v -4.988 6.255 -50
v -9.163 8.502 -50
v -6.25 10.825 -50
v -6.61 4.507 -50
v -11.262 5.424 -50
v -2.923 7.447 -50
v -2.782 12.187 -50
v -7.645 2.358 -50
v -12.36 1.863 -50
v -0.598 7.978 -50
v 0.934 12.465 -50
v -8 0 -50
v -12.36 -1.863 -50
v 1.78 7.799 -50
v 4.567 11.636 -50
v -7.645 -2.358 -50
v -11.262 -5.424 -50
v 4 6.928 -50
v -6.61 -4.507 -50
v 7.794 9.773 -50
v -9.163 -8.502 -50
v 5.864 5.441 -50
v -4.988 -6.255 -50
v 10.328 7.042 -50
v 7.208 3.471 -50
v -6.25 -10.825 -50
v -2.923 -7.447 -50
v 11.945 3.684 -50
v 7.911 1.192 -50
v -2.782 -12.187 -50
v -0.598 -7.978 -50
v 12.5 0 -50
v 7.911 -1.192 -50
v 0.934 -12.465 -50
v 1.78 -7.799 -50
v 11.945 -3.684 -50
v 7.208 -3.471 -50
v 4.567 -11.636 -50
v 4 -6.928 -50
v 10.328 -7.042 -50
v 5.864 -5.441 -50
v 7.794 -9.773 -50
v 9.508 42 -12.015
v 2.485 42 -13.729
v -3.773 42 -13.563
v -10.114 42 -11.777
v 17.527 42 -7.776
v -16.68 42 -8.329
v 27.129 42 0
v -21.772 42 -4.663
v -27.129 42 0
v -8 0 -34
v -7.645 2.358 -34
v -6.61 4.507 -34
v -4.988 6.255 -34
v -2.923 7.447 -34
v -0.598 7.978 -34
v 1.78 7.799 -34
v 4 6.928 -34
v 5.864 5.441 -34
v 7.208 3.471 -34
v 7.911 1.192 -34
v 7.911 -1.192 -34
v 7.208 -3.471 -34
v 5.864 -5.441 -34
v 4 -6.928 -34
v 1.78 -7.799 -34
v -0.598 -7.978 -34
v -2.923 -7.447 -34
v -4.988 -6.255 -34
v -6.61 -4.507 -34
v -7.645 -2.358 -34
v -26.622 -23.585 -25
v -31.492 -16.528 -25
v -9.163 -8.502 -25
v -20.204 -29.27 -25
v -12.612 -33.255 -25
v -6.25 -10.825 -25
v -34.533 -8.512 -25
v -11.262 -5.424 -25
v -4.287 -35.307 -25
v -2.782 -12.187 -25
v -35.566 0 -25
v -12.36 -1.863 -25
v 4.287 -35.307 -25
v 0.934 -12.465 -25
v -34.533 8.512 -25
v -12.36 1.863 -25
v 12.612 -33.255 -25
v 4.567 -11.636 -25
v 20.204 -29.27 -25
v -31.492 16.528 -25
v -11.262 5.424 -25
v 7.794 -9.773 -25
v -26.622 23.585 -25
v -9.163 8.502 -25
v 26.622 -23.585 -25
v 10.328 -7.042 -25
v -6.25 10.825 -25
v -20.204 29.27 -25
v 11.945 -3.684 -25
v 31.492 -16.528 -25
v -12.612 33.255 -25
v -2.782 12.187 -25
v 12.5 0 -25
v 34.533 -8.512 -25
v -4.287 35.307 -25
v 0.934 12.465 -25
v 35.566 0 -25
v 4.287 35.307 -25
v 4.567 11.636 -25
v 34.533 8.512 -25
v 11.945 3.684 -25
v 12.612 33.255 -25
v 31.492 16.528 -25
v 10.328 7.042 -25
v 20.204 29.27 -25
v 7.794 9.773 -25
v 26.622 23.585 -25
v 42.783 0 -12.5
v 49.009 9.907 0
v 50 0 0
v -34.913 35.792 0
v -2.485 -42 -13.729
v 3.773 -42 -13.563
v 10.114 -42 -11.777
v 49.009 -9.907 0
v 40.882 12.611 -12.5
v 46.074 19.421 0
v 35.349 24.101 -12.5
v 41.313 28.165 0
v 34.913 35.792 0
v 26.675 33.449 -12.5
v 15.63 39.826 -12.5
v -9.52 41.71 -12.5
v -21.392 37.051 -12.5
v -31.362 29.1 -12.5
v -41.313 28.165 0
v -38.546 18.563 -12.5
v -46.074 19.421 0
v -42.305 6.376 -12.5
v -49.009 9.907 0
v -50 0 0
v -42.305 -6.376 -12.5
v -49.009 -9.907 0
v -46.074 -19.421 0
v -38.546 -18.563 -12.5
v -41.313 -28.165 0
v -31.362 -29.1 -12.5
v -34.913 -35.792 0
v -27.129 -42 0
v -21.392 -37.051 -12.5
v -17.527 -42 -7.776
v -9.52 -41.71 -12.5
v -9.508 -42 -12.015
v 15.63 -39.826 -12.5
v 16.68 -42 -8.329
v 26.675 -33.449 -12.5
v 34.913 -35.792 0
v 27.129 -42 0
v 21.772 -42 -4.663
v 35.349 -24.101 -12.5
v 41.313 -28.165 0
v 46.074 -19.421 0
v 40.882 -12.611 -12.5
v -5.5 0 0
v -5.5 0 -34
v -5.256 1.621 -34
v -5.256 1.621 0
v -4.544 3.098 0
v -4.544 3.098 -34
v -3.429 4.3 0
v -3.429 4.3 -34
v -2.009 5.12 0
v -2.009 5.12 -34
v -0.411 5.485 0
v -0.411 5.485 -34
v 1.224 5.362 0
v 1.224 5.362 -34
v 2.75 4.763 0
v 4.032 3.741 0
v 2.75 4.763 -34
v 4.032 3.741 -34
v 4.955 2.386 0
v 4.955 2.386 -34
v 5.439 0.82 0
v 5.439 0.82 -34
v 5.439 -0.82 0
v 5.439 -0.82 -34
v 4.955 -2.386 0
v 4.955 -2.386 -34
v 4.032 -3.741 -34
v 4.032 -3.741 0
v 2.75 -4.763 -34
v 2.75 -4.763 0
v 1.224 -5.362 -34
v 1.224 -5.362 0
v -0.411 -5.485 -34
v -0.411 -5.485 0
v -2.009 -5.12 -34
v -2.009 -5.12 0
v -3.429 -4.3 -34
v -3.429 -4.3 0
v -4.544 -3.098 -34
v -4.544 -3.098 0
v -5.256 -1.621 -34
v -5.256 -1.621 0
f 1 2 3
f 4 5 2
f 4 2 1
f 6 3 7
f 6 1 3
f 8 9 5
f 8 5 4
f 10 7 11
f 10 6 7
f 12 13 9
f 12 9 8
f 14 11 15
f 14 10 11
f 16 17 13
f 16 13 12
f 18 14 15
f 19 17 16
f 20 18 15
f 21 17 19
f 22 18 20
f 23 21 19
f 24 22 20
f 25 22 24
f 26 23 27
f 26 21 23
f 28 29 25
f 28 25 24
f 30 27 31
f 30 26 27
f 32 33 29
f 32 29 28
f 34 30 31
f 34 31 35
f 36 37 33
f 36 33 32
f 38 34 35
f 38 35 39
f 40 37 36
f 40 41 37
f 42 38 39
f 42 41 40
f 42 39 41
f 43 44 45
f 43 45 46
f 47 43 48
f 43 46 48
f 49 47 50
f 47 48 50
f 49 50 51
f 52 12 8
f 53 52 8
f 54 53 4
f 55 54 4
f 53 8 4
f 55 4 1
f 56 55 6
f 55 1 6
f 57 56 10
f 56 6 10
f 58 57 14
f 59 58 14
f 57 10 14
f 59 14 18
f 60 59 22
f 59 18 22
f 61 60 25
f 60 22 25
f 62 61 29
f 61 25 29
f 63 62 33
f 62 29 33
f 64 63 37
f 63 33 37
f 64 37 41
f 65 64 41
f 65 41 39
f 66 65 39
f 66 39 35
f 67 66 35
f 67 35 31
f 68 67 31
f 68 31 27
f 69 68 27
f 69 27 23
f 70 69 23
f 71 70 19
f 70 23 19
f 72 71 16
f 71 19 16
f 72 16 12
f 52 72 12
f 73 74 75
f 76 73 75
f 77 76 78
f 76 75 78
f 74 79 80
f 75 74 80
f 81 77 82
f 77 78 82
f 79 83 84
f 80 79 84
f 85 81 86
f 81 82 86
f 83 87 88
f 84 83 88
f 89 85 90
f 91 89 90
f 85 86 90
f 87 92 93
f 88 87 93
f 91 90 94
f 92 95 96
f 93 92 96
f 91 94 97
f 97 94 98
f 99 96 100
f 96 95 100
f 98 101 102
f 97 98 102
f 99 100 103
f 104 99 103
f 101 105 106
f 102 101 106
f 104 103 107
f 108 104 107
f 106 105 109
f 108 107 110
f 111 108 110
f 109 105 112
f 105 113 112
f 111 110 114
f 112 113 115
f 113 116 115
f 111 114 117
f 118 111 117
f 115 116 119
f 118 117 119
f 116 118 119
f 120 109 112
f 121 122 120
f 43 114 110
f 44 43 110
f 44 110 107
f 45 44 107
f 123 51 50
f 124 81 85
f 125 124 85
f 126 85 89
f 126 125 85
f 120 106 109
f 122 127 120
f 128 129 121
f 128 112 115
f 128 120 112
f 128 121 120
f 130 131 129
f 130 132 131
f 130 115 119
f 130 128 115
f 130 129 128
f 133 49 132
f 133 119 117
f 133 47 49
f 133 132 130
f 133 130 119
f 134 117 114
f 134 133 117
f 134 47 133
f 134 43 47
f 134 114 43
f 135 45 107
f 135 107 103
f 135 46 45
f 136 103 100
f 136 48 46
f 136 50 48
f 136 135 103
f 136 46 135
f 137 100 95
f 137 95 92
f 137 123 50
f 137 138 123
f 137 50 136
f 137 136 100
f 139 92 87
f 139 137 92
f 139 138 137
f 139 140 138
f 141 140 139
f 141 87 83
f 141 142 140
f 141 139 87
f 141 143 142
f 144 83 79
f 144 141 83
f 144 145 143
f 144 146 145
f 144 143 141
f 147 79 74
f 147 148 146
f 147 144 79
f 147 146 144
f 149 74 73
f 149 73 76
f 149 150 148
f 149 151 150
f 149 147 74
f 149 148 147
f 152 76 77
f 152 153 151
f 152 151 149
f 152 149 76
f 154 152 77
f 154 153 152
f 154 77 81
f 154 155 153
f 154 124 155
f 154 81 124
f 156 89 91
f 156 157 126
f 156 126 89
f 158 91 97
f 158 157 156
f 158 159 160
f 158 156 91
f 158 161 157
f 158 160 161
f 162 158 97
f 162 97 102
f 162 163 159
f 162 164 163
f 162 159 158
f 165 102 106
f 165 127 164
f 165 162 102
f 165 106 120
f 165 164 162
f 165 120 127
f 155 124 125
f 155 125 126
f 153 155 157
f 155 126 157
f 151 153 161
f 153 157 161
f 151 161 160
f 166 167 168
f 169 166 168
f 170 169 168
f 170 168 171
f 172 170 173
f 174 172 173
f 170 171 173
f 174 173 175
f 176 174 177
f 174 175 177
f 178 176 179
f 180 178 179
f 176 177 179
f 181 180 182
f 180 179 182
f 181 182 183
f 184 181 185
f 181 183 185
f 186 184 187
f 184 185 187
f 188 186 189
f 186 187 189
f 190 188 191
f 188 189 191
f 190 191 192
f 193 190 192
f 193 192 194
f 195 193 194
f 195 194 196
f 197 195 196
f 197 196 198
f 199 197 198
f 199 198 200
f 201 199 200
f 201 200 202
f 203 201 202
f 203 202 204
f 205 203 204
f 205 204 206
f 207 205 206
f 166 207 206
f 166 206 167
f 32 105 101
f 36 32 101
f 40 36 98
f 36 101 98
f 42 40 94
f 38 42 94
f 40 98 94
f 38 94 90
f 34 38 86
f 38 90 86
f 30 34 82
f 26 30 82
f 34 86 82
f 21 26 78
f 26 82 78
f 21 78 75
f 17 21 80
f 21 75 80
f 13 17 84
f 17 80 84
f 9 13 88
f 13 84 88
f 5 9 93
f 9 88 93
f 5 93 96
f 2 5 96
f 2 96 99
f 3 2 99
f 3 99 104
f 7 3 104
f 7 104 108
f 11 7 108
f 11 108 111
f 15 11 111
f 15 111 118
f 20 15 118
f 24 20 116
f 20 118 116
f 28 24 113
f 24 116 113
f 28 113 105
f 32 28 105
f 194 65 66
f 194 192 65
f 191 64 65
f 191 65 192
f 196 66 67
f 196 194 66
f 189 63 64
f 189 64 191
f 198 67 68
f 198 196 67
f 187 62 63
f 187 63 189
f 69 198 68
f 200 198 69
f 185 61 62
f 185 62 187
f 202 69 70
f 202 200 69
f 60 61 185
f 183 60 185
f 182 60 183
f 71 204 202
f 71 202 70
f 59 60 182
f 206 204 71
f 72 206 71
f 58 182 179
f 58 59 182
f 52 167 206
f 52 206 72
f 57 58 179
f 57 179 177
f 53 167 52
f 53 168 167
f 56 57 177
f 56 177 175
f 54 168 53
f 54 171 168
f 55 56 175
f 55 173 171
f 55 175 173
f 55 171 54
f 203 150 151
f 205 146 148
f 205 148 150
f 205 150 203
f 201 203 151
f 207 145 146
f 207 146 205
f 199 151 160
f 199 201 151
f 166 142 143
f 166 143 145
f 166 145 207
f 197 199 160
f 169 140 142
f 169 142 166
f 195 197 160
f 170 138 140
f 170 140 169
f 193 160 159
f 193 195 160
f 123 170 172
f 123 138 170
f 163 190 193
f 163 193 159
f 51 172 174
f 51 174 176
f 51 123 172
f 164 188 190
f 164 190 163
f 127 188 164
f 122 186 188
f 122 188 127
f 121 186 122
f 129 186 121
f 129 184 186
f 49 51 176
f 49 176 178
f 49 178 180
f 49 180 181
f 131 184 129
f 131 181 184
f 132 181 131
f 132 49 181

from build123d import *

# Parameters (mm, degrees)
SKETCH1_R                  = 50
EXTRUDE1_DEPTH             = 25
EXTRUDE1_DRAFT             = -30
SKETCH2_R                  = 12.5
EXTRUDE2_DEPTH             = 25
SKETCH3_R                  = 8
CUT_EXTRUDE1_DEPTH         = 16
F_11_0_11_DIAMETER_HOLE1_D = 11
CUT_EXTRUDE2_DEPTH         = 76


with BuildPart() as part:
    # Sketch1 → Extrude1 (with draft: the straight prism first)
    with BuildSketch(Plane.XY):
        Circle(SKETCH1_R)
    extrude(amount=-EXTRUDE1_DEPTH)
    # Extrude1: the draft: its side faces are tilted about the plane it starts from
    extrude1_sides = [part.faces().sort_by_distance(p)[0] for p in [
        (-50, 0, -12.5),
    ]]
    draft(extrude1_sides, Plane.XY, EXTRUDE1_DRAFT)

    # Sketch2 → Extrude2 (add)
    with BuildSketch(Plane(origin=(0, 0, -25), x_dir=(-1, 0, 0), z_dir=(0, 0, -1))):
        with Locations(Location((0, 0, 0), (0, 0, 180))):
            Circle(SKETCH2_R)
    extrude(amount=EXTRUDE2_DEPTH)

    # Sketch3 → Cut-Extrude1 (cut)
    with BuildSketch(Plane(origin=(0, 0, -50), x_dir=(-1, 0, 0), z_dir=(0, 0, -1))):
        Circle(SKETCH3_R)
    extrude(amount=-CUT_EXTRUDE1_DEPTH, mode=Mode.SUBTRACT)

    # Ø11.0 (11) Diameter Hole1 (through all)
    with Locations(Plane.XY):
        with Locations((0, 0)):
            Hole(F_11_0_11_DIAMETER_HOLE1_D / 2)

    # Sketch7 → Cut-Extrude2 (cut, through all)
    with BuildSketch(Plane(origin=(0, 0, -25), x_dir=(-1, 0, 0), z_dir=(0, 0, -1))):
        Polygon((-55, 42), (60, 42), (60, -42), (-55, -42), (-55, -67), (80, -67), (80, 67), (-55, 67), align=None)
    extrude(amount=-CUT_EXTRUDE2_DEPTH, mode=Mode.SUBTRACT)


solid = part.part
